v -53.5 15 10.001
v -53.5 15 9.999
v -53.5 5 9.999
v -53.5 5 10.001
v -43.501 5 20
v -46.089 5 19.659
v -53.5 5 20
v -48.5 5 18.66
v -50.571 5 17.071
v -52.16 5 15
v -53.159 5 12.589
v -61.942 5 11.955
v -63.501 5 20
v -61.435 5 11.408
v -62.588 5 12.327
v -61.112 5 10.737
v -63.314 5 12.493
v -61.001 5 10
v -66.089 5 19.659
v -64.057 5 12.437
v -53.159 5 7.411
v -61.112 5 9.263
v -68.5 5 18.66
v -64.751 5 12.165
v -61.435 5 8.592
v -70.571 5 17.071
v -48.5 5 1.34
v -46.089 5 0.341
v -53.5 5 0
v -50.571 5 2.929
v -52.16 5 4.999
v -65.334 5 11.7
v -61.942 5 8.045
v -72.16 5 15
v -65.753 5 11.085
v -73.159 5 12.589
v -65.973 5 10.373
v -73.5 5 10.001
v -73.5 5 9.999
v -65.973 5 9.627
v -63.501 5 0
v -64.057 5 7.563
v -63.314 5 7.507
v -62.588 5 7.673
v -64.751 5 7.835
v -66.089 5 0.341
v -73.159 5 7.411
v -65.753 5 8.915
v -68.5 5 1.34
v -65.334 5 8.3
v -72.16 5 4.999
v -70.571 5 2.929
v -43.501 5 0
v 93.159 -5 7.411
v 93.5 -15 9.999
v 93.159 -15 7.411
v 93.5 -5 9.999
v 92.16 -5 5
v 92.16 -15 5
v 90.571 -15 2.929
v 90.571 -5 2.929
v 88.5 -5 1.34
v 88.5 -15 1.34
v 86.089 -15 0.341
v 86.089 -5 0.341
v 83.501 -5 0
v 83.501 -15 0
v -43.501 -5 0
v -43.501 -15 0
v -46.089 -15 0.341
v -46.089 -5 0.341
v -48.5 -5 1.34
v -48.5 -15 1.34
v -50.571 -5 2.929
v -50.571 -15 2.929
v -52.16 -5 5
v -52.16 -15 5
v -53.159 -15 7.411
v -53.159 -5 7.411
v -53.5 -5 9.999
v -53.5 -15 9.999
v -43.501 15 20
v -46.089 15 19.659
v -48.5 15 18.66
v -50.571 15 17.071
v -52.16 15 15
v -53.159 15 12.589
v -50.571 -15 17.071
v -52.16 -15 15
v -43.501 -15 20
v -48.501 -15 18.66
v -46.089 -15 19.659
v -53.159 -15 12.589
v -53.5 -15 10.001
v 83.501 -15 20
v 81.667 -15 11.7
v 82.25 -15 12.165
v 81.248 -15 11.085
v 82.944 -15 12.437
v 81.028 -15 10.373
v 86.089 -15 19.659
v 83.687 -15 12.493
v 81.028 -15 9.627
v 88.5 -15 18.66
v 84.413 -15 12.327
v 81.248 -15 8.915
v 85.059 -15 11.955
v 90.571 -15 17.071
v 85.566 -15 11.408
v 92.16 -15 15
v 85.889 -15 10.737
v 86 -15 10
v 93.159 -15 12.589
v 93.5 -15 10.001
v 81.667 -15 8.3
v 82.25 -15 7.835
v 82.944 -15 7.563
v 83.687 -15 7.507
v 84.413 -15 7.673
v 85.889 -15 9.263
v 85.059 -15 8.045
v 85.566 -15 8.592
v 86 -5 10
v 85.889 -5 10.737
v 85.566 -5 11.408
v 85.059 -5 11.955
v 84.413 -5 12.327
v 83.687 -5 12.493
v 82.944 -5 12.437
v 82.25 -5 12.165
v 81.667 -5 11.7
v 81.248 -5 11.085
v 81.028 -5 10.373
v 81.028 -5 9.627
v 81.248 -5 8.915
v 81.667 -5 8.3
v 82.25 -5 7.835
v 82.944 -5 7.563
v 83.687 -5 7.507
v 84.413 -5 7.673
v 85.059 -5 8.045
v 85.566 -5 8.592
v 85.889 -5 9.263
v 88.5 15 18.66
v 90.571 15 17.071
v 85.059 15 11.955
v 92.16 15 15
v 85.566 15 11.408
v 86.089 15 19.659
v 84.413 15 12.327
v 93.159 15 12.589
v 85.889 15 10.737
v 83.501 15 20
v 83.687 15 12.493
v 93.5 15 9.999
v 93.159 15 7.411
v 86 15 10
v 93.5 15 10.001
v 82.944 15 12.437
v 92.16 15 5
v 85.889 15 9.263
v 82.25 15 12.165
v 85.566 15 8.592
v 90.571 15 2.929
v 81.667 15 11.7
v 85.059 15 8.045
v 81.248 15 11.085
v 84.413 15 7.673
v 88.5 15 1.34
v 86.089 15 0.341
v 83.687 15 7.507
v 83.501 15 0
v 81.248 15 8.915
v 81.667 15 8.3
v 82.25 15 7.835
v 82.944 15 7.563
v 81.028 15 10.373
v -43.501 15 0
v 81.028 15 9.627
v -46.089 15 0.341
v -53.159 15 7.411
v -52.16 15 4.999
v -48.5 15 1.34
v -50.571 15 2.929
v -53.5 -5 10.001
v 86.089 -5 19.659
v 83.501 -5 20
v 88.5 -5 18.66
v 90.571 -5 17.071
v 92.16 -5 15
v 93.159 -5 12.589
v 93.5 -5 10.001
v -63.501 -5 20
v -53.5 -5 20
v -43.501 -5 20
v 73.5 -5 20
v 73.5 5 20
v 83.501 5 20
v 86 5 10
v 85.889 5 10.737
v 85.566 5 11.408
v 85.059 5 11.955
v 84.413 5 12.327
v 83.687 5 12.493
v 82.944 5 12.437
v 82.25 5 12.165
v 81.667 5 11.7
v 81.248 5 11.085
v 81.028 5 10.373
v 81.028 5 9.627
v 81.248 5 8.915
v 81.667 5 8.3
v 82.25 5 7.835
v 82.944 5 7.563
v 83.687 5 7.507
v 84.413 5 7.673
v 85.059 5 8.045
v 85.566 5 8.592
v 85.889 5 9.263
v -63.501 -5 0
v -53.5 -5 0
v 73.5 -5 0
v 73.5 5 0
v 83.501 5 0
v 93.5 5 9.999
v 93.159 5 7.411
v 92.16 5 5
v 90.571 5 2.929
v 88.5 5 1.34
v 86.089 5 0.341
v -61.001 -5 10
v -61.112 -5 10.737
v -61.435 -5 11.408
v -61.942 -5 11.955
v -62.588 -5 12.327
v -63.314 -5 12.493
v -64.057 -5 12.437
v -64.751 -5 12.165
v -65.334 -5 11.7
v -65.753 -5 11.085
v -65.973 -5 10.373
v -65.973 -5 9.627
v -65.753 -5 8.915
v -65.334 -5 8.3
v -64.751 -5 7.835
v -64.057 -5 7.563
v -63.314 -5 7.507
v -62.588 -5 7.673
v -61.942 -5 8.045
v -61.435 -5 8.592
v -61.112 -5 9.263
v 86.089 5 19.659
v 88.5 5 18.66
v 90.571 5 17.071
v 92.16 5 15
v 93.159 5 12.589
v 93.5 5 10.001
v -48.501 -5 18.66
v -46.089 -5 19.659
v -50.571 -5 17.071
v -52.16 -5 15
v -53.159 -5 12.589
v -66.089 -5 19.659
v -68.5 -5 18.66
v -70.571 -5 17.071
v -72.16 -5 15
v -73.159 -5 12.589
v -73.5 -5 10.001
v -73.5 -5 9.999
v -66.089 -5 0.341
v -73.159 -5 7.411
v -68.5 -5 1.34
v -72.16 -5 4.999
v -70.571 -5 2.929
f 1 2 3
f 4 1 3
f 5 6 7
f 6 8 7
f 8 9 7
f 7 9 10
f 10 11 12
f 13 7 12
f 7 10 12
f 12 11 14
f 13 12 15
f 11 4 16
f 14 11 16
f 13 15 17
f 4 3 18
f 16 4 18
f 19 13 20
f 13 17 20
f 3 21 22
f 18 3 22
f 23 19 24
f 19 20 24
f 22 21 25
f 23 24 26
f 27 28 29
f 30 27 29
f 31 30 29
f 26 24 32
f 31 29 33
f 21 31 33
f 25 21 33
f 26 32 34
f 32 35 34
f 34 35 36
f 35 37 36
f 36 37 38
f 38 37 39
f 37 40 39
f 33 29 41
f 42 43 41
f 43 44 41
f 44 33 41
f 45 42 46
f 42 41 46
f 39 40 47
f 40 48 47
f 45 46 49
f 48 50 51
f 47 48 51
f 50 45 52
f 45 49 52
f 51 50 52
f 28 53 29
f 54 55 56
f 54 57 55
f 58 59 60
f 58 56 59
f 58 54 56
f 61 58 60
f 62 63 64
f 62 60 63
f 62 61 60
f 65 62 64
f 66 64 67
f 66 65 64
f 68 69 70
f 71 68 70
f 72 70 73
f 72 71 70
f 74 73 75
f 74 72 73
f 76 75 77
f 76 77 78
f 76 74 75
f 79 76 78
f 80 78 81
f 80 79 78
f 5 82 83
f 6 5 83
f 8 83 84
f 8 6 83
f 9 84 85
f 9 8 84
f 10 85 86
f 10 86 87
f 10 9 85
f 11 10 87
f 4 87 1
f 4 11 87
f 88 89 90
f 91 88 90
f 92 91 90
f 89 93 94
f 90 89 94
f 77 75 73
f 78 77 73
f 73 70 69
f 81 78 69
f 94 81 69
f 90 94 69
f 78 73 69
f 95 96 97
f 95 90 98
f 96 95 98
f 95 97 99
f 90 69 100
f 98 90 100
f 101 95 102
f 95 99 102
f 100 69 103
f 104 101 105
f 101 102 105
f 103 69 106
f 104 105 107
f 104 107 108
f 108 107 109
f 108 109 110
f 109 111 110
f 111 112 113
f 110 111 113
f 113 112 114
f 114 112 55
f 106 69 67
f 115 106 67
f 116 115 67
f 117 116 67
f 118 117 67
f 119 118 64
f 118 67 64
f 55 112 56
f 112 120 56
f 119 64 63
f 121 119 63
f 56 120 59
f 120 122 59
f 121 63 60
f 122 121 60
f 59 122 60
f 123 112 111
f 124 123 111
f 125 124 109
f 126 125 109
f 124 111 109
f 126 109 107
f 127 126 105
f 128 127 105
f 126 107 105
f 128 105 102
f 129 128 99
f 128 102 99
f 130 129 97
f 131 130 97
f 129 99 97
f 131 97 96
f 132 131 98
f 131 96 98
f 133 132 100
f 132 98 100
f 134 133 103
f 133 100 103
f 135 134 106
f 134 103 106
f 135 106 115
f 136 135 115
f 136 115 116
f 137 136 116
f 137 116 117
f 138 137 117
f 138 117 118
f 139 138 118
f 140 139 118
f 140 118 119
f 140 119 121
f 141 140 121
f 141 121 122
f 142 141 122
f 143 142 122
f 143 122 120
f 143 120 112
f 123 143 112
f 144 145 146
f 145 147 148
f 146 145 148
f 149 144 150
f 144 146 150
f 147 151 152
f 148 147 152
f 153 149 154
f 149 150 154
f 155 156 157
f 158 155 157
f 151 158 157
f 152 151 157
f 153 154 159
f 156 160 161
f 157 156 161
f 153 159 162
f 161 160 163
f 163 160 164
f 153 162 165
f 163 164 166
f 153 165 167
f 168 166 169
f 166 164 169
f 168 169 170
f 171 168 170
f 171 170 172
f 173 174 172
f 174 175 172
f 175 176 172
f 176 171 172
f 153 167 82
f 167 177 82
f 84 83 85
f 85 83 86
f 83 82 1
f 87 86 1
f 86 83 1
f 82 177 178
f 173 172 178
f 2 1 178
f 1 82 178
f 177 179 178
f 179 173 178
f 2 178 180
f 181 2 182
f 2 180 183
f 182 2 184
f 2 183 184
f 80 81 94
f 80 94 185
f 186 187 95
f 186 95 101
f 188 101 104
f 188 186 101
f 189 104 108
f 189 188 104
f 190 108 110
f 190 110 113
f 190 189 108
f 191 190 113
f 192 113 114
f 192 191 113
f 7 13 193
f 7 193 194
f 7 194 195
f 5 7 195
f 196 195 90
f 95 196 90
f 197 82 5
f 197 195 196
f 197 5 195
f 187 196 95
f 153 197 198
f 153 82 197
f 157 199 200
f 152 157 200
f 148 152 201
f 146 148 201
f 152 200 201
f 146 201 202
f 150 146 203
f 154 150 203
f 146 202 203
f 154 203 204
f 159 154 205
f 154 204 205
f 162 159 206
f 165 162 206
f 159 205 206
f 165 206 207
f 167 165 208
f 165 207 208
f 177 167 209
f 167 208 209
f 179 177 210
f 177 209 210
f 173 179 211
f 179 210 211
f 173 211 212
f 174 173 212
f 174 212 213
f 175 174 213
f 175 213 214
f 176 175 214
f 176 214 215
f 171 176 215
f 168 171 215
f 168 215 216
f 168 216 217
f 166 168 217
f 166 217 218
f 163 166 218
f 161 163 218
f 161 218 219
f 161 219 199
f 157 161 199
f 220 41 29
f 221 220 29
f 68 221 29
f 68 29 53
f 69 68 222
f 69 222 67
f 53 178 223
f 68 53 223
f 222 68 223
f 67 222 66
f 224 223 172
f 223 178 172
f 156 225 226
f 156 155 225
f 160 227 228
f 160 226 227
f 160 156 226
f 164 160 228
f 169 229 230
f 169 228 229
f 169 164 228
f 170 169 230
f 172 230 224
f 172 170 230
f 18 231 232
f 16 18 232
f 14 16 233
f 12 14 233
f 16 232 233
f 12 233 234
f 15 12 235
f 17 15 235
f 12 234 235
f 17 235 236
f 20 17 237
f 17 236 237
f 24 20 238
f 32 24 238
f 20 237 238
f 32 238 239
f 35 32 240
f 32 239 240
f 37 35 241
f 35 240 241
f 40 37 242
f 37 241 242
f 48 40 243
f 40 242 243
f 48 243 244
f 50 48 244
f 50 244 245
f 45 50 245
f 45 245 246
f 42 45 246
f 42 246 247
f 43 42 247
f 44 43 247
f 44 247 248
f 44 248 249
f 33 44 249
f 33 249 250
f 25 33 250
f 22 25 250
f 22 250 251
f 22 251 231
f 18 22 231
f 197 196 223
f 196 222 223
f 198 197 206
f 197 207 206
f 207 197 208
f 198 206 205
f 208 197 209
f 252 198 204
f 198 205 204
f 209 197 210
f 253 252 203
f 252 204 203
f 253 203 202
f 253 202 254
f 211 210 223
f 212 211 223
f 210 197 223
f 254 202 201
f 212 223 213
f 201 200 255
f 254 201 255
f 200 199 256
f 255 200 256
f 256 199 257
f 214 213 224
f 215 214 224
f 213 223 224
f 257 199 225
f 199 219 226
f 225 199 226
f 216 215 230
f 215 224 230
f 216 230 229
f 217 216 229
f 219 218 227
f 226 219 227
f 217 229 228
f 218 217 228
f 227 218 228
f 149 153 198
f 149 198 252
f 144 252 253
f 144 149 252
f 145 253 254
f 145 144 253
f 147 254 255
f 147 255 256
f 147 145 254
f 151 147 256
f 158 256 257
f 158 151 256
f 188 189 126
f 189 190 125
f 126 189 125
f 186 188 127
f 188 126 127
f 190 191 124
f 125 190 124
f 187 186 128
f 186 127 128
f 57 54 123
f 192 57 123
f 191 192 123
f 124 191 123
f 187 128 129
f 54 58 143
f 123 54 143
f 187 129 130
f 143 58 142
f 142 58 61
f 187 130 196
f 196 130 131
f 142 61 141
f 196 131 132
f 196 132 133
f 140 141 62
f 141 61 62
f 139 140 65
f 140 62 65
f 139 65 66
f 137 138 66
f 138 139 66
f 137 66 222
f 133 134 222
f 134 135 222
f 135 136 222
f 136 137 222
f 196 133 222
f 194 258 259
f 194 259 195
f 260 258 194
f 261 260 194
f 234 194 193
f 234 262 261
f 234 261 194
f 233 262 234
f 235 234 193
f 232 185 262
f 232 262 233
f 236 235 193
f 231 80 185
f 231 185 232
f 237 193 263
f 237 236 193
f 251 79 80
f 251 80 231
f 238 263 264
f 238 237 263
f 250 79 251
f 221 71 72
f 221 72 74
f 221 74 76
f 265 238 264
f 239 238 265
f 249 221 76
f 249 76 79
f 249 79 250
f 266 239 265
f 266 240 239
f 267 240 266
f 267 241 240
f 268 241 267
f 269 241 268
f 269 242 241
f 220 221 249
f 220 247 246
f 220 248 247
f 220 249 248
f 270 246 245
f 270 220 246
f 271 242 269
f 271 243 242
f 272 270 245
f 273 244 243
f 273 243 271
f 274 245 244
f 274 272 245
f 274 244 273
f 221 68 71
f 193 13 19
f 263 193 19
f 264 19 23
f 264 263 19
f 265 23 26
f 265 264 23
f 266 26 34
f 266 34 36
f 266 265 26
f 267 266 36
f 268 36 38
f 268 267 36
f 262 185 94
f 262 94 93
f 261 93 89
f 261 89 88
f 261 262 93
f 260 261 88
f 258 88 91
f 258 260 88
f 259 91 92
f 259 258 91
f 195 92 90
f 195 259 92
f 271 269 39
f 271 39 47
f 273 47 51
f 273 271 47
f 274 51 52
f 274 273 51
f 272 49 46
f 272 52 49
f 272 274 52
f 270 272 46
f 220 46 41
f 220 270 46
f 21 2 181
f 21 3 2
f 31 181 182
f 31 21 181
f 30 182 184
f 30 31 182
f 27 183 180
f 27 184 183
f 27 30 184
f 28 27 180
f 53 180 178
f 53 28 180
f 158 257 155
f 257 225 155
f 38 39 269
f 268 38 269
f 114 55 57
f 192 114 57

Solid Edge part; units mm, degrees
sketch "Sketch1" plane through (0, 0, 0) normal (0, 0, 1) x (1, 0, 0)
  line L0 (-53.5, -15) -> (93.5, -15)
  line L1 (93.5, -15) -> (93.5, -5)
  line L2 (93.5, -5) -> (73.5, -5)
  line L3 (73.5, -5) -> (73.5, 5)
  line L4 (73.5, 5) -> (93.5, 5)
  line L5 (93.5, 5) -> (93.5, 15)
  line L6 (93.5, 15) -> (-53.5, 15)
  line L7 (-53.5, 15) -> (-53.5, 5)
  line L8 (-53.5, 5) -> (-73.5, 5)
  line L9 (-73.5, 5) -> (-73.5, -5)
  line L10 (-53.5, -5) -> (-73.5, -5)
  line L11 (-53.5, -15) -> (-53.5, -5)
extrude "Protrusion1" add sketch "Sketch1" along normal blind 20
sketch "Sketch2" plane through (0, -15, 10) normal (0, -1, 0) x (1, 0, 0)
  circle A0 centre (83.5, 0) radius 2.5
  circle A1 centre (-63.501, 0) radius 2.5
  dimension "D1" = 10
  dimension "D2" = 5
  dimension "D3" = 5
  dimension "D4" = 9.999
extrude "Cutout1" cut sketch "Sketch2" against normal through all
fillet "Redondeo_1" radius 10 6 edges at (-73.5, 0, 20) (93.5, -10, 20) (93.5, -10, 0) (-73.5, 0, 0) (93.5, 10, 20) (93.5, 10, 0)
fillet "Redondeo_2" radius 10 4 edges at (-53.5, -10, 20) (-53.5, 10, 20) (-53.5, 10, 0) (-53.5, -10, 0)
